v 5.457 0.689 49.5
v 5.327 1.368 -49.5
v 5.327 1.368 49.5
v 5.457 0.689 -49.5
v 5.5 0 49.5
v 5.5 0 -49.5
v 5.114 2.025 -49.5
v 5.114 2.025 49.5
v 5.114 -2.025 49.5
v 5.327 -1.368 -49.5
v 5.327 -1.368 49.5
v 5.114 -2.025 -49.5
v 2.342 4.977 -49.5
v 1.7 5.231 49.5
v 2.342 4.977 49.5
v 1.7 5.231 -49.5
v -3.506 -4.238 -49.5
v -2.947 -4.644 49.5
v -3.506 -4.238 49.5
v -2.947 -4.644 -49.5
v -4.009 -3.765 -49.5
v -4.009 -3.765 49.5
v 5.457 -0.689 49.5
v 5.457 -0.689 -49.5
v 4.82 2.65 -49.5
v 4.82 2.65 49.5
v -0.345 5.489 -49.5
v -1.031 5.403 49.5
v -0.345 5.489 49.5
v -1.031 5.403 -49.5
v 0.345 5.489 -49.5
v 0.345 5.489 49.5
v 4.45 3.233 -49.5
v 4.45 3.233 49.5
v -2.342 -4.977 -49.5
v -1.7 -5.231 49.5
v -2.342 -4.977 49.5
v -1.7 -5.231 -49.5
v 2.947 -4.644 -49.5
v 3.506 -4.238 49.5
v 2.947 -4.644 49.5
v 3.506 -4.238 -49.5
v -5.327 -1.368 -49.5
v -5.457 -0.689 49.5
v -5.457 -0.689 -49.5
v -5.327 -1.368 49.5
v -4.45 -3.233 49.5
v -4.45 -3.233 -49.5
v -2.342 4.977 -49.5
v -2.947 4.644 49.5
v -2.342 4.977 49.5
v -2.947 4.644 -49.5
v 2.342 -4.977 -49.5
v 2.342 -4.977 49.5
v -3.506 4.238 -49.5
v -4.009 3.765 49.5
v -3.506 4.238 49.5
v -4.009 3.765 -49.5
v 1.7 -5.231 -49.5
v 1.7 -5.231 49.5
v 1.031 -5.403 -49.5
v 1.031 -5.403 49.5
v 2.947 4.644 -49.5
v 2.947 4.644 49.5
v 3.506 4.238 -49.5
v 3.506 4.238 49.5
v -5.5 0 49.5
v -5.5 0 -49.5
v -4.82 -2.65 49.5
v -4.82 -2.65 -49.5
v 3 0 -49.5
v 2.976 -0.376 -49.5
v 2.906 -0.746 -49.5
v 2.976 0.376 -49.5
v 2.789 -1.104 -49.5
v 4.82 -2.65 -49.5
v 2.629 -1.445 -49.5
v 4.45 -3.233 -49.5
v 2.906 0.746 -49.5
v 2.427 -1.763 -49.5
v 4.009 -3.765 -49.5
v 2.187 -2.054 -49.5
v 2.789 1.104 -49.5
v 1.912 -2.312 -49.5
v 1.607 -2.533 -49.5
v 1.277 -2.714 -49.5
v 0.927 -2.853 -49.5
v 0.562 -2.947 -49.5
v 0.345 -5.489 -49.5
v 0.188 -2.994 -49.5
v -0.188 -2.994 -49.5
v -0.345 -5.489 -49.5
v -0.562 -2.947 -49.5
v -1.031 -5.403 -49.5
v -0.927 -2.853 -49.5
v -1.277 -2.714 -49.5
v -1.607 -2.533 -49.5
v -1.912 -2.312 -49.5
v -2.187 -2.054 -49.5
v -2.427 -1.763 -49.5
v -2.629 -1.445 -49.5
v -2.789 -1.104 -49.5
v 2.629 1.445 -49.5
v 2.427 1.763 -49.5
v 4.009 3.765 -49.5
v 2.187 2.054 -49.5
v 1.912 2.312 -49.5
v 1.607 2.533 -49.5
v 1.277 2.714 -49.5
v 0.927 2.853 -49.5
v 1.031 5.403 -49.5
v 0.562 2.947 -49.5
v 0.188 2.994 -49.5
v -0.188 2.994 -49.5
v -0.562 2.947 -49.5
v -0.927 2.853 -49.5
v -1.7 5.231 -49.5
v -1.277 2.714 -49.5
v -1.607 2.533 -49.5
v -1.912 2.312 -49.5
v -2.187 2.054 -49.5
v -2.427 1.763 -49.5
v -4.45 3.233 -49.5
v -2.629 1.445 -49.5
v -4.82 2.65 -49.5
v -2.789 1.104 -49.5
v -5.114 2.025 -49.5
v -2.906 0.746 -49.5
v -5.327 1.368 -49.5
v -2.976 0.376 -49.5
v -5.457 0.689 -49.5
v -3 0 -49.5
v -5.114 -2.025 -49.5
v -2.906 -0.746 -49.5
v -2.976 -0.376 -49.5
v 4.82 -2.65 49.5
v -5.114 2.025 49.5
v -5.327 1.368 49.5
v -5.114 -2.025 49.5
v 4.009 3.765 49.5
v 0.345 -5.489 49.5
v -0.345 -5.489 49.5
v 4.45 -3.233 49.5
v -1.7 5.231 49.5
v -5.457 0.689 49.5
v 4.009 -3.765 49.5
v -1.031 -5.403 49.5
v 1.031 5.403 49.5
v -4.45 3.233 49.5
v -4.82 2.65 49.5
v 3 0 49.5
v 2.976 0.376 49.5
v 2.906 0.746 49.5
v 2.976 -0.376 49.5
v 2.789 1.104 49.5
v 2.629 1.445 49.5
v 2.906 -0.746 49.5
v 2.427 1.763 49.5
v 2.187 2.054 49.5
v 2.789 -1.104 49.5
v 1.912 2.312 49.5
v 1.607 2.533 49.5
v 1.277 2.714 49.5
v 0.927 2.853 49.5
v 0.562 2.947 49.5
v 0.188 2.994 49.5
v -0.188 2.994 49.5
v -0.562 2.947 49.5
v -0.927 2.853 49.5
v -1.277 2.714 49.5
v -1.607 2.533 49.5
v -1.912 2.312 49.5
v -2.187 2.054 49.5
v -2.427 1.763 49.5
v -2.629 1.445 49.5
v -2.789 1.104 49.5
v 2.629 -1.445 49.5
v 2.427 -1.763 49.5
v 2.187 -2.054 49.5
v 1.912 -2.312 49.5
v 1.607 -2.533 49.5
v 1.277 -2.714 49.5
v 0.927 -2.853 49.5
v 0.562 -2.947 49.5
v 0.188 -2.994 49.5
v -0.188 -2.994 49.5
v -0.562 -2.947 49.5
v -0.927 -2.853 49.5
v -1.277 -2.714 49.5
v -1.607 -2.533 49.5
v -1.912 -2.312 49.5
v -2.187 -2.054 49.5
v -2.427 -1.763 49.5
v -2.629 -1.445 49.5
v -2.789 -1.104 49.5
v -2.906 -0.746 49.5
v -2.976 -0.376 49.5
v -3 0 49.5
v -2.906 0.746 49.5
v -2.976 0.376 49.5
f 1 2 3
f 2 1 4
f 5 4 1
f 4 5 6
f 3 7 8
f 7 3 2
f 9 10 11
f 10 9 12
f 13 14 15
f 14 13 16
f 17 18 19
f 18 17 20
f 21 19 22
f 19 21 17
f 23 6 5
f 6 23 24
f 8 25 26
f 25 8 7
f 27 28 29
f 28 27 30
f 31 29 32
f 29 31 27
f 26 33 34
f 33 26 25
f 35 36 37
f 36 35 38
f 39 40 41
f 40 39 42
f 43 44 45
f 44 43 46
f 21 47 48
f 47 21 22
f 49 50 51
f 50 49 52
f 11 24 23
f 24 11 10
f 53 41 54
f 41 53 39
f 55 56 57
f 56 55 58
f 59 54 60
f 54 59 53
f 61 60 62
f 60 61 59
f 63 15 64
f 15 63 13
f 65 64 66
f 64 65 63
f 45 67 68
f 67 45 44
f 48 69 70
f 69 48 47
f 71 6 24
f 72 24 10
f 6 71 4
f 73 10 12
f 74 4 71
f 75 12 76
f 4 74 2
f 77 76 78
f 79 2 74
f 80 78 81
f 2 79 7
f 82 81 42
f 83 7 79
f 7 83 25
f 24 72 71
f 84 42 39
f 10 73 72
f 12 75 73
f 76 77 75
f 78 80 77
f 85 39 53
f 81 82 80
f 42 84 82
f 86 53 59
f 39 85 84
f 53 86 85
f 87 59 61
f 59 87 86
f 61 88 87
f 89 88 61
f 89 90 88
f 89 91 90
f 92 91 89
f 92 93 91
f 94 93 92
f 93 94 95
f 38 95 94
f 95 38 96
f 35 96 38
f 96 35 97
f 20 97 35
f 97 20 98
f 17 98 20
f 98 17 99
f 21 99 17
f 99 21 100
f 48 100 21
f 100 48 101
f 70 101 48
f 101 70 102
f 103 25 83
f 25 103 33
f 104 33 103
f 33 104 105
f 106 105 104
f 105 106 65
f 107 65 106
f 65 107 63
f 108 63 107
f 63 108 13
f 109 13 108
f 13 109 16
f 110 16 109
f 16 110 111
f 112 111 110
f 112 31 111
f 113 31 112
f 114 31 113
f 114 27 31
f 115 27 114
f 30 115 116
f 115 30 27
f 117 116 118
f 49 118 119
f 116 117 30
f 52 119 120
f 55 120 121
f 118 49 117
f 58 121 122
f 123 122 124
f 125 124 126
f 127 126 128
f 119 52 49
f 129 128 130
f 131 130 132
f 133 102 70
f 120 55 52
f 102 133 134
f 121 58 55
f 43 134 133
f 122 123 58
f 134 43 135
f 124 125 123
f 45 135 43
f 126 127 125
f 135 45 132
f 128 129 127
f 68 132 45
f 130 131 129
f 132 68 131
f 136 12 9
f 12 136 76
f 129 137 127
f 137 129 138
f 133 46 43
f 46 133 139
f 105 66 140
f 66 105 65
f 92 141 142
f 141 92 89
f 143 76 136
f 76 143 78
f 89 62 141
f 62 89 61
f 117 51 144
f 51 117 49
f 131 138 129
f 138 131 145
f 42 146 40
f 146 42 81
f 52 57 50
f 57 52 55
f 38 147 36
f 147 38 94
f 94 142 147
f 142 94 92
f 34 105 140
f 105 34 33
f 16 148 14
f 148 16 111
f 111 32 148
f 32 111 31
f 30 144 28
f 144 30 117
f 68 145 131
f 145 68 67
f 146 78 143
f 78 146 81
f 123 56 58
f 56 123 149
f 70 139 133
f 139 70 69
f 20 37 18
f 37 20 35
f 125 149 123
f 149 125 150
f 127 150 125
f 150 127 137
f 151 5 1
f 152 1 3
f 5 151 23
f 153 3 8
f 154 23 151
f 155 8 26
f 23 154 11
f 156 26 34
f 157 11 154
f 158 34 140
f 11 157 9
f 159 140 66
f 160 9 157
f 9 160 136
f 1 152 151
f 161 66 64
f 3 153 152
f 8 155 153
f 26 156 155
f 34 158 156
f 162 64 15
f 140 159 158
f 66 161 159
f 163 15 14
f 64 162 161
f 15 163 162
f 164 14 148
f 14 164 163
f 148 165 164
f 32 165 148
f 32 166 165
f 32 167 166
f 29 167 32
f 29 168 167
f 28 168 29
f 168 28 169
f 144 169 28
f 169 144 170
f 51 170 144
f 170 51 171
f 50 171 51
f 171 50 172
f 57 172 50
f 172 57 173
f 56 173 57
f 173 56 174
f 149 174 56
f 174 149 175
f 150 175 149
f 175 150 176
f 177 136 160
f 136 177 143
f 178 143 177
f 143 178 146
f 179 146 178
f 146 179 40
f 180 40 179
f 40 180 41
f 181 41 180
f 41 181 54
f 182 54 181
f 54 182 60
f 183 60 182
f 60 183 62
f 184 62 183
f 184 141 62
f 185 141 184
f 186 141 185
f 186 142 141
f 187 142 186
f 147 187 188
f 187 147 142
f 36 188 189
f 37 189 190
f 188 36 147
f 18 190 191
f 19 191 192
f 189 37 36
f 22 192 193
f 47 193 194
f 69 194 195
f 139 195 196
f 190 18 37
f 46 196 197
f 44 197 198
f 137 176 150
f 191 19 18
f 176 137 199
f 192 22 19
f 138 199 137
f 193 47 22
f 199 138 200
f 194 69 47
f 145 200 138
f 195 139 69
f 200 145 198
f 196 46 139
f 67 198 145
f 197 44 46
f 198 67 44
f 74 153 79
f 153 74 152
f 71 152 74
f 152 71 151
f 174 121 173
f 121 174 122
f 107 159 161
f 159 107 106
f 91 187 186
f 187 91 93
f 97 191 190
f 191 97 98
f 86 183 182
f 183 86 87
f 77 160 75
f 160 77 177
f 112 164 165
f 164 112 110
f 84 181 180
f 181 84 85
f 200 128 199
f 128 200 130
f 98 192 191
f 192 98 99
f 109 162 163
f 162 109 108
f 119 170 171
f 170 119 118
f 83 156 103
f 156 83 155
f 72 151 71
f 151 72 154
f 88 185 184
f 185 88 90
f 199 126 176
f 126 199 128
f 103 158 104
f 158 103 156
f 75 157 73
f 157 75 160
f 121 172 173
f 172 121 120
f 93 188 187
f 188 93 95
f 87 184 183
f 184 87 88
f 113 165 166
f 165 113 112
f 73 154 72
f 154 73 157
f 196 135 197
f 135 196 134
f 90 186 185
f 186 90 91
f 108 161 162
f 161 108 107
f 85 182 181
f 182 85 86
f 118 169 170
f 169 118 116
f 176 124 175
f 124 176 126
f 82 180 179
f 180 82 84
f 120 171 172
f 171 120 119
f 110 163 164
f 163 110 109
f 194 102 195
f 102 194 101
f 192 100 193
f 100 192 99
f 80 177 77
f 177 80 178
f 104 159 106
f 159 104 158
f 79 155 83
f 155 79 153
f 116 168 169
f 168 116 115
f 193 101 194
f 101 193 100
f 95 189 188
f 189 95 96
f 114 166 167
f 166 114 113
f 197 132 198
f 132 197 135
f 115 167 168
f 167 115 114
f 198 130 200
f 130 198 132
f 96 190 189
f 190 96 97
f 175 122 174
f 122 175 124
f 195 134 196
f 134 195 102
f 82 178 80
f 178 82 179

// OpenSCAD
$fn = 50;


difference() {
	union() {
		translate(v = [0, 0, -49.5000000000]) {
			cylinder(h = 99, r = 5.5000000000);
		}
	}
	union() {
		translate(v = [0, 0, -100.0000000000]) {
			cylinder(h = 200, r = 3.0000000000);
		}
	}
}
